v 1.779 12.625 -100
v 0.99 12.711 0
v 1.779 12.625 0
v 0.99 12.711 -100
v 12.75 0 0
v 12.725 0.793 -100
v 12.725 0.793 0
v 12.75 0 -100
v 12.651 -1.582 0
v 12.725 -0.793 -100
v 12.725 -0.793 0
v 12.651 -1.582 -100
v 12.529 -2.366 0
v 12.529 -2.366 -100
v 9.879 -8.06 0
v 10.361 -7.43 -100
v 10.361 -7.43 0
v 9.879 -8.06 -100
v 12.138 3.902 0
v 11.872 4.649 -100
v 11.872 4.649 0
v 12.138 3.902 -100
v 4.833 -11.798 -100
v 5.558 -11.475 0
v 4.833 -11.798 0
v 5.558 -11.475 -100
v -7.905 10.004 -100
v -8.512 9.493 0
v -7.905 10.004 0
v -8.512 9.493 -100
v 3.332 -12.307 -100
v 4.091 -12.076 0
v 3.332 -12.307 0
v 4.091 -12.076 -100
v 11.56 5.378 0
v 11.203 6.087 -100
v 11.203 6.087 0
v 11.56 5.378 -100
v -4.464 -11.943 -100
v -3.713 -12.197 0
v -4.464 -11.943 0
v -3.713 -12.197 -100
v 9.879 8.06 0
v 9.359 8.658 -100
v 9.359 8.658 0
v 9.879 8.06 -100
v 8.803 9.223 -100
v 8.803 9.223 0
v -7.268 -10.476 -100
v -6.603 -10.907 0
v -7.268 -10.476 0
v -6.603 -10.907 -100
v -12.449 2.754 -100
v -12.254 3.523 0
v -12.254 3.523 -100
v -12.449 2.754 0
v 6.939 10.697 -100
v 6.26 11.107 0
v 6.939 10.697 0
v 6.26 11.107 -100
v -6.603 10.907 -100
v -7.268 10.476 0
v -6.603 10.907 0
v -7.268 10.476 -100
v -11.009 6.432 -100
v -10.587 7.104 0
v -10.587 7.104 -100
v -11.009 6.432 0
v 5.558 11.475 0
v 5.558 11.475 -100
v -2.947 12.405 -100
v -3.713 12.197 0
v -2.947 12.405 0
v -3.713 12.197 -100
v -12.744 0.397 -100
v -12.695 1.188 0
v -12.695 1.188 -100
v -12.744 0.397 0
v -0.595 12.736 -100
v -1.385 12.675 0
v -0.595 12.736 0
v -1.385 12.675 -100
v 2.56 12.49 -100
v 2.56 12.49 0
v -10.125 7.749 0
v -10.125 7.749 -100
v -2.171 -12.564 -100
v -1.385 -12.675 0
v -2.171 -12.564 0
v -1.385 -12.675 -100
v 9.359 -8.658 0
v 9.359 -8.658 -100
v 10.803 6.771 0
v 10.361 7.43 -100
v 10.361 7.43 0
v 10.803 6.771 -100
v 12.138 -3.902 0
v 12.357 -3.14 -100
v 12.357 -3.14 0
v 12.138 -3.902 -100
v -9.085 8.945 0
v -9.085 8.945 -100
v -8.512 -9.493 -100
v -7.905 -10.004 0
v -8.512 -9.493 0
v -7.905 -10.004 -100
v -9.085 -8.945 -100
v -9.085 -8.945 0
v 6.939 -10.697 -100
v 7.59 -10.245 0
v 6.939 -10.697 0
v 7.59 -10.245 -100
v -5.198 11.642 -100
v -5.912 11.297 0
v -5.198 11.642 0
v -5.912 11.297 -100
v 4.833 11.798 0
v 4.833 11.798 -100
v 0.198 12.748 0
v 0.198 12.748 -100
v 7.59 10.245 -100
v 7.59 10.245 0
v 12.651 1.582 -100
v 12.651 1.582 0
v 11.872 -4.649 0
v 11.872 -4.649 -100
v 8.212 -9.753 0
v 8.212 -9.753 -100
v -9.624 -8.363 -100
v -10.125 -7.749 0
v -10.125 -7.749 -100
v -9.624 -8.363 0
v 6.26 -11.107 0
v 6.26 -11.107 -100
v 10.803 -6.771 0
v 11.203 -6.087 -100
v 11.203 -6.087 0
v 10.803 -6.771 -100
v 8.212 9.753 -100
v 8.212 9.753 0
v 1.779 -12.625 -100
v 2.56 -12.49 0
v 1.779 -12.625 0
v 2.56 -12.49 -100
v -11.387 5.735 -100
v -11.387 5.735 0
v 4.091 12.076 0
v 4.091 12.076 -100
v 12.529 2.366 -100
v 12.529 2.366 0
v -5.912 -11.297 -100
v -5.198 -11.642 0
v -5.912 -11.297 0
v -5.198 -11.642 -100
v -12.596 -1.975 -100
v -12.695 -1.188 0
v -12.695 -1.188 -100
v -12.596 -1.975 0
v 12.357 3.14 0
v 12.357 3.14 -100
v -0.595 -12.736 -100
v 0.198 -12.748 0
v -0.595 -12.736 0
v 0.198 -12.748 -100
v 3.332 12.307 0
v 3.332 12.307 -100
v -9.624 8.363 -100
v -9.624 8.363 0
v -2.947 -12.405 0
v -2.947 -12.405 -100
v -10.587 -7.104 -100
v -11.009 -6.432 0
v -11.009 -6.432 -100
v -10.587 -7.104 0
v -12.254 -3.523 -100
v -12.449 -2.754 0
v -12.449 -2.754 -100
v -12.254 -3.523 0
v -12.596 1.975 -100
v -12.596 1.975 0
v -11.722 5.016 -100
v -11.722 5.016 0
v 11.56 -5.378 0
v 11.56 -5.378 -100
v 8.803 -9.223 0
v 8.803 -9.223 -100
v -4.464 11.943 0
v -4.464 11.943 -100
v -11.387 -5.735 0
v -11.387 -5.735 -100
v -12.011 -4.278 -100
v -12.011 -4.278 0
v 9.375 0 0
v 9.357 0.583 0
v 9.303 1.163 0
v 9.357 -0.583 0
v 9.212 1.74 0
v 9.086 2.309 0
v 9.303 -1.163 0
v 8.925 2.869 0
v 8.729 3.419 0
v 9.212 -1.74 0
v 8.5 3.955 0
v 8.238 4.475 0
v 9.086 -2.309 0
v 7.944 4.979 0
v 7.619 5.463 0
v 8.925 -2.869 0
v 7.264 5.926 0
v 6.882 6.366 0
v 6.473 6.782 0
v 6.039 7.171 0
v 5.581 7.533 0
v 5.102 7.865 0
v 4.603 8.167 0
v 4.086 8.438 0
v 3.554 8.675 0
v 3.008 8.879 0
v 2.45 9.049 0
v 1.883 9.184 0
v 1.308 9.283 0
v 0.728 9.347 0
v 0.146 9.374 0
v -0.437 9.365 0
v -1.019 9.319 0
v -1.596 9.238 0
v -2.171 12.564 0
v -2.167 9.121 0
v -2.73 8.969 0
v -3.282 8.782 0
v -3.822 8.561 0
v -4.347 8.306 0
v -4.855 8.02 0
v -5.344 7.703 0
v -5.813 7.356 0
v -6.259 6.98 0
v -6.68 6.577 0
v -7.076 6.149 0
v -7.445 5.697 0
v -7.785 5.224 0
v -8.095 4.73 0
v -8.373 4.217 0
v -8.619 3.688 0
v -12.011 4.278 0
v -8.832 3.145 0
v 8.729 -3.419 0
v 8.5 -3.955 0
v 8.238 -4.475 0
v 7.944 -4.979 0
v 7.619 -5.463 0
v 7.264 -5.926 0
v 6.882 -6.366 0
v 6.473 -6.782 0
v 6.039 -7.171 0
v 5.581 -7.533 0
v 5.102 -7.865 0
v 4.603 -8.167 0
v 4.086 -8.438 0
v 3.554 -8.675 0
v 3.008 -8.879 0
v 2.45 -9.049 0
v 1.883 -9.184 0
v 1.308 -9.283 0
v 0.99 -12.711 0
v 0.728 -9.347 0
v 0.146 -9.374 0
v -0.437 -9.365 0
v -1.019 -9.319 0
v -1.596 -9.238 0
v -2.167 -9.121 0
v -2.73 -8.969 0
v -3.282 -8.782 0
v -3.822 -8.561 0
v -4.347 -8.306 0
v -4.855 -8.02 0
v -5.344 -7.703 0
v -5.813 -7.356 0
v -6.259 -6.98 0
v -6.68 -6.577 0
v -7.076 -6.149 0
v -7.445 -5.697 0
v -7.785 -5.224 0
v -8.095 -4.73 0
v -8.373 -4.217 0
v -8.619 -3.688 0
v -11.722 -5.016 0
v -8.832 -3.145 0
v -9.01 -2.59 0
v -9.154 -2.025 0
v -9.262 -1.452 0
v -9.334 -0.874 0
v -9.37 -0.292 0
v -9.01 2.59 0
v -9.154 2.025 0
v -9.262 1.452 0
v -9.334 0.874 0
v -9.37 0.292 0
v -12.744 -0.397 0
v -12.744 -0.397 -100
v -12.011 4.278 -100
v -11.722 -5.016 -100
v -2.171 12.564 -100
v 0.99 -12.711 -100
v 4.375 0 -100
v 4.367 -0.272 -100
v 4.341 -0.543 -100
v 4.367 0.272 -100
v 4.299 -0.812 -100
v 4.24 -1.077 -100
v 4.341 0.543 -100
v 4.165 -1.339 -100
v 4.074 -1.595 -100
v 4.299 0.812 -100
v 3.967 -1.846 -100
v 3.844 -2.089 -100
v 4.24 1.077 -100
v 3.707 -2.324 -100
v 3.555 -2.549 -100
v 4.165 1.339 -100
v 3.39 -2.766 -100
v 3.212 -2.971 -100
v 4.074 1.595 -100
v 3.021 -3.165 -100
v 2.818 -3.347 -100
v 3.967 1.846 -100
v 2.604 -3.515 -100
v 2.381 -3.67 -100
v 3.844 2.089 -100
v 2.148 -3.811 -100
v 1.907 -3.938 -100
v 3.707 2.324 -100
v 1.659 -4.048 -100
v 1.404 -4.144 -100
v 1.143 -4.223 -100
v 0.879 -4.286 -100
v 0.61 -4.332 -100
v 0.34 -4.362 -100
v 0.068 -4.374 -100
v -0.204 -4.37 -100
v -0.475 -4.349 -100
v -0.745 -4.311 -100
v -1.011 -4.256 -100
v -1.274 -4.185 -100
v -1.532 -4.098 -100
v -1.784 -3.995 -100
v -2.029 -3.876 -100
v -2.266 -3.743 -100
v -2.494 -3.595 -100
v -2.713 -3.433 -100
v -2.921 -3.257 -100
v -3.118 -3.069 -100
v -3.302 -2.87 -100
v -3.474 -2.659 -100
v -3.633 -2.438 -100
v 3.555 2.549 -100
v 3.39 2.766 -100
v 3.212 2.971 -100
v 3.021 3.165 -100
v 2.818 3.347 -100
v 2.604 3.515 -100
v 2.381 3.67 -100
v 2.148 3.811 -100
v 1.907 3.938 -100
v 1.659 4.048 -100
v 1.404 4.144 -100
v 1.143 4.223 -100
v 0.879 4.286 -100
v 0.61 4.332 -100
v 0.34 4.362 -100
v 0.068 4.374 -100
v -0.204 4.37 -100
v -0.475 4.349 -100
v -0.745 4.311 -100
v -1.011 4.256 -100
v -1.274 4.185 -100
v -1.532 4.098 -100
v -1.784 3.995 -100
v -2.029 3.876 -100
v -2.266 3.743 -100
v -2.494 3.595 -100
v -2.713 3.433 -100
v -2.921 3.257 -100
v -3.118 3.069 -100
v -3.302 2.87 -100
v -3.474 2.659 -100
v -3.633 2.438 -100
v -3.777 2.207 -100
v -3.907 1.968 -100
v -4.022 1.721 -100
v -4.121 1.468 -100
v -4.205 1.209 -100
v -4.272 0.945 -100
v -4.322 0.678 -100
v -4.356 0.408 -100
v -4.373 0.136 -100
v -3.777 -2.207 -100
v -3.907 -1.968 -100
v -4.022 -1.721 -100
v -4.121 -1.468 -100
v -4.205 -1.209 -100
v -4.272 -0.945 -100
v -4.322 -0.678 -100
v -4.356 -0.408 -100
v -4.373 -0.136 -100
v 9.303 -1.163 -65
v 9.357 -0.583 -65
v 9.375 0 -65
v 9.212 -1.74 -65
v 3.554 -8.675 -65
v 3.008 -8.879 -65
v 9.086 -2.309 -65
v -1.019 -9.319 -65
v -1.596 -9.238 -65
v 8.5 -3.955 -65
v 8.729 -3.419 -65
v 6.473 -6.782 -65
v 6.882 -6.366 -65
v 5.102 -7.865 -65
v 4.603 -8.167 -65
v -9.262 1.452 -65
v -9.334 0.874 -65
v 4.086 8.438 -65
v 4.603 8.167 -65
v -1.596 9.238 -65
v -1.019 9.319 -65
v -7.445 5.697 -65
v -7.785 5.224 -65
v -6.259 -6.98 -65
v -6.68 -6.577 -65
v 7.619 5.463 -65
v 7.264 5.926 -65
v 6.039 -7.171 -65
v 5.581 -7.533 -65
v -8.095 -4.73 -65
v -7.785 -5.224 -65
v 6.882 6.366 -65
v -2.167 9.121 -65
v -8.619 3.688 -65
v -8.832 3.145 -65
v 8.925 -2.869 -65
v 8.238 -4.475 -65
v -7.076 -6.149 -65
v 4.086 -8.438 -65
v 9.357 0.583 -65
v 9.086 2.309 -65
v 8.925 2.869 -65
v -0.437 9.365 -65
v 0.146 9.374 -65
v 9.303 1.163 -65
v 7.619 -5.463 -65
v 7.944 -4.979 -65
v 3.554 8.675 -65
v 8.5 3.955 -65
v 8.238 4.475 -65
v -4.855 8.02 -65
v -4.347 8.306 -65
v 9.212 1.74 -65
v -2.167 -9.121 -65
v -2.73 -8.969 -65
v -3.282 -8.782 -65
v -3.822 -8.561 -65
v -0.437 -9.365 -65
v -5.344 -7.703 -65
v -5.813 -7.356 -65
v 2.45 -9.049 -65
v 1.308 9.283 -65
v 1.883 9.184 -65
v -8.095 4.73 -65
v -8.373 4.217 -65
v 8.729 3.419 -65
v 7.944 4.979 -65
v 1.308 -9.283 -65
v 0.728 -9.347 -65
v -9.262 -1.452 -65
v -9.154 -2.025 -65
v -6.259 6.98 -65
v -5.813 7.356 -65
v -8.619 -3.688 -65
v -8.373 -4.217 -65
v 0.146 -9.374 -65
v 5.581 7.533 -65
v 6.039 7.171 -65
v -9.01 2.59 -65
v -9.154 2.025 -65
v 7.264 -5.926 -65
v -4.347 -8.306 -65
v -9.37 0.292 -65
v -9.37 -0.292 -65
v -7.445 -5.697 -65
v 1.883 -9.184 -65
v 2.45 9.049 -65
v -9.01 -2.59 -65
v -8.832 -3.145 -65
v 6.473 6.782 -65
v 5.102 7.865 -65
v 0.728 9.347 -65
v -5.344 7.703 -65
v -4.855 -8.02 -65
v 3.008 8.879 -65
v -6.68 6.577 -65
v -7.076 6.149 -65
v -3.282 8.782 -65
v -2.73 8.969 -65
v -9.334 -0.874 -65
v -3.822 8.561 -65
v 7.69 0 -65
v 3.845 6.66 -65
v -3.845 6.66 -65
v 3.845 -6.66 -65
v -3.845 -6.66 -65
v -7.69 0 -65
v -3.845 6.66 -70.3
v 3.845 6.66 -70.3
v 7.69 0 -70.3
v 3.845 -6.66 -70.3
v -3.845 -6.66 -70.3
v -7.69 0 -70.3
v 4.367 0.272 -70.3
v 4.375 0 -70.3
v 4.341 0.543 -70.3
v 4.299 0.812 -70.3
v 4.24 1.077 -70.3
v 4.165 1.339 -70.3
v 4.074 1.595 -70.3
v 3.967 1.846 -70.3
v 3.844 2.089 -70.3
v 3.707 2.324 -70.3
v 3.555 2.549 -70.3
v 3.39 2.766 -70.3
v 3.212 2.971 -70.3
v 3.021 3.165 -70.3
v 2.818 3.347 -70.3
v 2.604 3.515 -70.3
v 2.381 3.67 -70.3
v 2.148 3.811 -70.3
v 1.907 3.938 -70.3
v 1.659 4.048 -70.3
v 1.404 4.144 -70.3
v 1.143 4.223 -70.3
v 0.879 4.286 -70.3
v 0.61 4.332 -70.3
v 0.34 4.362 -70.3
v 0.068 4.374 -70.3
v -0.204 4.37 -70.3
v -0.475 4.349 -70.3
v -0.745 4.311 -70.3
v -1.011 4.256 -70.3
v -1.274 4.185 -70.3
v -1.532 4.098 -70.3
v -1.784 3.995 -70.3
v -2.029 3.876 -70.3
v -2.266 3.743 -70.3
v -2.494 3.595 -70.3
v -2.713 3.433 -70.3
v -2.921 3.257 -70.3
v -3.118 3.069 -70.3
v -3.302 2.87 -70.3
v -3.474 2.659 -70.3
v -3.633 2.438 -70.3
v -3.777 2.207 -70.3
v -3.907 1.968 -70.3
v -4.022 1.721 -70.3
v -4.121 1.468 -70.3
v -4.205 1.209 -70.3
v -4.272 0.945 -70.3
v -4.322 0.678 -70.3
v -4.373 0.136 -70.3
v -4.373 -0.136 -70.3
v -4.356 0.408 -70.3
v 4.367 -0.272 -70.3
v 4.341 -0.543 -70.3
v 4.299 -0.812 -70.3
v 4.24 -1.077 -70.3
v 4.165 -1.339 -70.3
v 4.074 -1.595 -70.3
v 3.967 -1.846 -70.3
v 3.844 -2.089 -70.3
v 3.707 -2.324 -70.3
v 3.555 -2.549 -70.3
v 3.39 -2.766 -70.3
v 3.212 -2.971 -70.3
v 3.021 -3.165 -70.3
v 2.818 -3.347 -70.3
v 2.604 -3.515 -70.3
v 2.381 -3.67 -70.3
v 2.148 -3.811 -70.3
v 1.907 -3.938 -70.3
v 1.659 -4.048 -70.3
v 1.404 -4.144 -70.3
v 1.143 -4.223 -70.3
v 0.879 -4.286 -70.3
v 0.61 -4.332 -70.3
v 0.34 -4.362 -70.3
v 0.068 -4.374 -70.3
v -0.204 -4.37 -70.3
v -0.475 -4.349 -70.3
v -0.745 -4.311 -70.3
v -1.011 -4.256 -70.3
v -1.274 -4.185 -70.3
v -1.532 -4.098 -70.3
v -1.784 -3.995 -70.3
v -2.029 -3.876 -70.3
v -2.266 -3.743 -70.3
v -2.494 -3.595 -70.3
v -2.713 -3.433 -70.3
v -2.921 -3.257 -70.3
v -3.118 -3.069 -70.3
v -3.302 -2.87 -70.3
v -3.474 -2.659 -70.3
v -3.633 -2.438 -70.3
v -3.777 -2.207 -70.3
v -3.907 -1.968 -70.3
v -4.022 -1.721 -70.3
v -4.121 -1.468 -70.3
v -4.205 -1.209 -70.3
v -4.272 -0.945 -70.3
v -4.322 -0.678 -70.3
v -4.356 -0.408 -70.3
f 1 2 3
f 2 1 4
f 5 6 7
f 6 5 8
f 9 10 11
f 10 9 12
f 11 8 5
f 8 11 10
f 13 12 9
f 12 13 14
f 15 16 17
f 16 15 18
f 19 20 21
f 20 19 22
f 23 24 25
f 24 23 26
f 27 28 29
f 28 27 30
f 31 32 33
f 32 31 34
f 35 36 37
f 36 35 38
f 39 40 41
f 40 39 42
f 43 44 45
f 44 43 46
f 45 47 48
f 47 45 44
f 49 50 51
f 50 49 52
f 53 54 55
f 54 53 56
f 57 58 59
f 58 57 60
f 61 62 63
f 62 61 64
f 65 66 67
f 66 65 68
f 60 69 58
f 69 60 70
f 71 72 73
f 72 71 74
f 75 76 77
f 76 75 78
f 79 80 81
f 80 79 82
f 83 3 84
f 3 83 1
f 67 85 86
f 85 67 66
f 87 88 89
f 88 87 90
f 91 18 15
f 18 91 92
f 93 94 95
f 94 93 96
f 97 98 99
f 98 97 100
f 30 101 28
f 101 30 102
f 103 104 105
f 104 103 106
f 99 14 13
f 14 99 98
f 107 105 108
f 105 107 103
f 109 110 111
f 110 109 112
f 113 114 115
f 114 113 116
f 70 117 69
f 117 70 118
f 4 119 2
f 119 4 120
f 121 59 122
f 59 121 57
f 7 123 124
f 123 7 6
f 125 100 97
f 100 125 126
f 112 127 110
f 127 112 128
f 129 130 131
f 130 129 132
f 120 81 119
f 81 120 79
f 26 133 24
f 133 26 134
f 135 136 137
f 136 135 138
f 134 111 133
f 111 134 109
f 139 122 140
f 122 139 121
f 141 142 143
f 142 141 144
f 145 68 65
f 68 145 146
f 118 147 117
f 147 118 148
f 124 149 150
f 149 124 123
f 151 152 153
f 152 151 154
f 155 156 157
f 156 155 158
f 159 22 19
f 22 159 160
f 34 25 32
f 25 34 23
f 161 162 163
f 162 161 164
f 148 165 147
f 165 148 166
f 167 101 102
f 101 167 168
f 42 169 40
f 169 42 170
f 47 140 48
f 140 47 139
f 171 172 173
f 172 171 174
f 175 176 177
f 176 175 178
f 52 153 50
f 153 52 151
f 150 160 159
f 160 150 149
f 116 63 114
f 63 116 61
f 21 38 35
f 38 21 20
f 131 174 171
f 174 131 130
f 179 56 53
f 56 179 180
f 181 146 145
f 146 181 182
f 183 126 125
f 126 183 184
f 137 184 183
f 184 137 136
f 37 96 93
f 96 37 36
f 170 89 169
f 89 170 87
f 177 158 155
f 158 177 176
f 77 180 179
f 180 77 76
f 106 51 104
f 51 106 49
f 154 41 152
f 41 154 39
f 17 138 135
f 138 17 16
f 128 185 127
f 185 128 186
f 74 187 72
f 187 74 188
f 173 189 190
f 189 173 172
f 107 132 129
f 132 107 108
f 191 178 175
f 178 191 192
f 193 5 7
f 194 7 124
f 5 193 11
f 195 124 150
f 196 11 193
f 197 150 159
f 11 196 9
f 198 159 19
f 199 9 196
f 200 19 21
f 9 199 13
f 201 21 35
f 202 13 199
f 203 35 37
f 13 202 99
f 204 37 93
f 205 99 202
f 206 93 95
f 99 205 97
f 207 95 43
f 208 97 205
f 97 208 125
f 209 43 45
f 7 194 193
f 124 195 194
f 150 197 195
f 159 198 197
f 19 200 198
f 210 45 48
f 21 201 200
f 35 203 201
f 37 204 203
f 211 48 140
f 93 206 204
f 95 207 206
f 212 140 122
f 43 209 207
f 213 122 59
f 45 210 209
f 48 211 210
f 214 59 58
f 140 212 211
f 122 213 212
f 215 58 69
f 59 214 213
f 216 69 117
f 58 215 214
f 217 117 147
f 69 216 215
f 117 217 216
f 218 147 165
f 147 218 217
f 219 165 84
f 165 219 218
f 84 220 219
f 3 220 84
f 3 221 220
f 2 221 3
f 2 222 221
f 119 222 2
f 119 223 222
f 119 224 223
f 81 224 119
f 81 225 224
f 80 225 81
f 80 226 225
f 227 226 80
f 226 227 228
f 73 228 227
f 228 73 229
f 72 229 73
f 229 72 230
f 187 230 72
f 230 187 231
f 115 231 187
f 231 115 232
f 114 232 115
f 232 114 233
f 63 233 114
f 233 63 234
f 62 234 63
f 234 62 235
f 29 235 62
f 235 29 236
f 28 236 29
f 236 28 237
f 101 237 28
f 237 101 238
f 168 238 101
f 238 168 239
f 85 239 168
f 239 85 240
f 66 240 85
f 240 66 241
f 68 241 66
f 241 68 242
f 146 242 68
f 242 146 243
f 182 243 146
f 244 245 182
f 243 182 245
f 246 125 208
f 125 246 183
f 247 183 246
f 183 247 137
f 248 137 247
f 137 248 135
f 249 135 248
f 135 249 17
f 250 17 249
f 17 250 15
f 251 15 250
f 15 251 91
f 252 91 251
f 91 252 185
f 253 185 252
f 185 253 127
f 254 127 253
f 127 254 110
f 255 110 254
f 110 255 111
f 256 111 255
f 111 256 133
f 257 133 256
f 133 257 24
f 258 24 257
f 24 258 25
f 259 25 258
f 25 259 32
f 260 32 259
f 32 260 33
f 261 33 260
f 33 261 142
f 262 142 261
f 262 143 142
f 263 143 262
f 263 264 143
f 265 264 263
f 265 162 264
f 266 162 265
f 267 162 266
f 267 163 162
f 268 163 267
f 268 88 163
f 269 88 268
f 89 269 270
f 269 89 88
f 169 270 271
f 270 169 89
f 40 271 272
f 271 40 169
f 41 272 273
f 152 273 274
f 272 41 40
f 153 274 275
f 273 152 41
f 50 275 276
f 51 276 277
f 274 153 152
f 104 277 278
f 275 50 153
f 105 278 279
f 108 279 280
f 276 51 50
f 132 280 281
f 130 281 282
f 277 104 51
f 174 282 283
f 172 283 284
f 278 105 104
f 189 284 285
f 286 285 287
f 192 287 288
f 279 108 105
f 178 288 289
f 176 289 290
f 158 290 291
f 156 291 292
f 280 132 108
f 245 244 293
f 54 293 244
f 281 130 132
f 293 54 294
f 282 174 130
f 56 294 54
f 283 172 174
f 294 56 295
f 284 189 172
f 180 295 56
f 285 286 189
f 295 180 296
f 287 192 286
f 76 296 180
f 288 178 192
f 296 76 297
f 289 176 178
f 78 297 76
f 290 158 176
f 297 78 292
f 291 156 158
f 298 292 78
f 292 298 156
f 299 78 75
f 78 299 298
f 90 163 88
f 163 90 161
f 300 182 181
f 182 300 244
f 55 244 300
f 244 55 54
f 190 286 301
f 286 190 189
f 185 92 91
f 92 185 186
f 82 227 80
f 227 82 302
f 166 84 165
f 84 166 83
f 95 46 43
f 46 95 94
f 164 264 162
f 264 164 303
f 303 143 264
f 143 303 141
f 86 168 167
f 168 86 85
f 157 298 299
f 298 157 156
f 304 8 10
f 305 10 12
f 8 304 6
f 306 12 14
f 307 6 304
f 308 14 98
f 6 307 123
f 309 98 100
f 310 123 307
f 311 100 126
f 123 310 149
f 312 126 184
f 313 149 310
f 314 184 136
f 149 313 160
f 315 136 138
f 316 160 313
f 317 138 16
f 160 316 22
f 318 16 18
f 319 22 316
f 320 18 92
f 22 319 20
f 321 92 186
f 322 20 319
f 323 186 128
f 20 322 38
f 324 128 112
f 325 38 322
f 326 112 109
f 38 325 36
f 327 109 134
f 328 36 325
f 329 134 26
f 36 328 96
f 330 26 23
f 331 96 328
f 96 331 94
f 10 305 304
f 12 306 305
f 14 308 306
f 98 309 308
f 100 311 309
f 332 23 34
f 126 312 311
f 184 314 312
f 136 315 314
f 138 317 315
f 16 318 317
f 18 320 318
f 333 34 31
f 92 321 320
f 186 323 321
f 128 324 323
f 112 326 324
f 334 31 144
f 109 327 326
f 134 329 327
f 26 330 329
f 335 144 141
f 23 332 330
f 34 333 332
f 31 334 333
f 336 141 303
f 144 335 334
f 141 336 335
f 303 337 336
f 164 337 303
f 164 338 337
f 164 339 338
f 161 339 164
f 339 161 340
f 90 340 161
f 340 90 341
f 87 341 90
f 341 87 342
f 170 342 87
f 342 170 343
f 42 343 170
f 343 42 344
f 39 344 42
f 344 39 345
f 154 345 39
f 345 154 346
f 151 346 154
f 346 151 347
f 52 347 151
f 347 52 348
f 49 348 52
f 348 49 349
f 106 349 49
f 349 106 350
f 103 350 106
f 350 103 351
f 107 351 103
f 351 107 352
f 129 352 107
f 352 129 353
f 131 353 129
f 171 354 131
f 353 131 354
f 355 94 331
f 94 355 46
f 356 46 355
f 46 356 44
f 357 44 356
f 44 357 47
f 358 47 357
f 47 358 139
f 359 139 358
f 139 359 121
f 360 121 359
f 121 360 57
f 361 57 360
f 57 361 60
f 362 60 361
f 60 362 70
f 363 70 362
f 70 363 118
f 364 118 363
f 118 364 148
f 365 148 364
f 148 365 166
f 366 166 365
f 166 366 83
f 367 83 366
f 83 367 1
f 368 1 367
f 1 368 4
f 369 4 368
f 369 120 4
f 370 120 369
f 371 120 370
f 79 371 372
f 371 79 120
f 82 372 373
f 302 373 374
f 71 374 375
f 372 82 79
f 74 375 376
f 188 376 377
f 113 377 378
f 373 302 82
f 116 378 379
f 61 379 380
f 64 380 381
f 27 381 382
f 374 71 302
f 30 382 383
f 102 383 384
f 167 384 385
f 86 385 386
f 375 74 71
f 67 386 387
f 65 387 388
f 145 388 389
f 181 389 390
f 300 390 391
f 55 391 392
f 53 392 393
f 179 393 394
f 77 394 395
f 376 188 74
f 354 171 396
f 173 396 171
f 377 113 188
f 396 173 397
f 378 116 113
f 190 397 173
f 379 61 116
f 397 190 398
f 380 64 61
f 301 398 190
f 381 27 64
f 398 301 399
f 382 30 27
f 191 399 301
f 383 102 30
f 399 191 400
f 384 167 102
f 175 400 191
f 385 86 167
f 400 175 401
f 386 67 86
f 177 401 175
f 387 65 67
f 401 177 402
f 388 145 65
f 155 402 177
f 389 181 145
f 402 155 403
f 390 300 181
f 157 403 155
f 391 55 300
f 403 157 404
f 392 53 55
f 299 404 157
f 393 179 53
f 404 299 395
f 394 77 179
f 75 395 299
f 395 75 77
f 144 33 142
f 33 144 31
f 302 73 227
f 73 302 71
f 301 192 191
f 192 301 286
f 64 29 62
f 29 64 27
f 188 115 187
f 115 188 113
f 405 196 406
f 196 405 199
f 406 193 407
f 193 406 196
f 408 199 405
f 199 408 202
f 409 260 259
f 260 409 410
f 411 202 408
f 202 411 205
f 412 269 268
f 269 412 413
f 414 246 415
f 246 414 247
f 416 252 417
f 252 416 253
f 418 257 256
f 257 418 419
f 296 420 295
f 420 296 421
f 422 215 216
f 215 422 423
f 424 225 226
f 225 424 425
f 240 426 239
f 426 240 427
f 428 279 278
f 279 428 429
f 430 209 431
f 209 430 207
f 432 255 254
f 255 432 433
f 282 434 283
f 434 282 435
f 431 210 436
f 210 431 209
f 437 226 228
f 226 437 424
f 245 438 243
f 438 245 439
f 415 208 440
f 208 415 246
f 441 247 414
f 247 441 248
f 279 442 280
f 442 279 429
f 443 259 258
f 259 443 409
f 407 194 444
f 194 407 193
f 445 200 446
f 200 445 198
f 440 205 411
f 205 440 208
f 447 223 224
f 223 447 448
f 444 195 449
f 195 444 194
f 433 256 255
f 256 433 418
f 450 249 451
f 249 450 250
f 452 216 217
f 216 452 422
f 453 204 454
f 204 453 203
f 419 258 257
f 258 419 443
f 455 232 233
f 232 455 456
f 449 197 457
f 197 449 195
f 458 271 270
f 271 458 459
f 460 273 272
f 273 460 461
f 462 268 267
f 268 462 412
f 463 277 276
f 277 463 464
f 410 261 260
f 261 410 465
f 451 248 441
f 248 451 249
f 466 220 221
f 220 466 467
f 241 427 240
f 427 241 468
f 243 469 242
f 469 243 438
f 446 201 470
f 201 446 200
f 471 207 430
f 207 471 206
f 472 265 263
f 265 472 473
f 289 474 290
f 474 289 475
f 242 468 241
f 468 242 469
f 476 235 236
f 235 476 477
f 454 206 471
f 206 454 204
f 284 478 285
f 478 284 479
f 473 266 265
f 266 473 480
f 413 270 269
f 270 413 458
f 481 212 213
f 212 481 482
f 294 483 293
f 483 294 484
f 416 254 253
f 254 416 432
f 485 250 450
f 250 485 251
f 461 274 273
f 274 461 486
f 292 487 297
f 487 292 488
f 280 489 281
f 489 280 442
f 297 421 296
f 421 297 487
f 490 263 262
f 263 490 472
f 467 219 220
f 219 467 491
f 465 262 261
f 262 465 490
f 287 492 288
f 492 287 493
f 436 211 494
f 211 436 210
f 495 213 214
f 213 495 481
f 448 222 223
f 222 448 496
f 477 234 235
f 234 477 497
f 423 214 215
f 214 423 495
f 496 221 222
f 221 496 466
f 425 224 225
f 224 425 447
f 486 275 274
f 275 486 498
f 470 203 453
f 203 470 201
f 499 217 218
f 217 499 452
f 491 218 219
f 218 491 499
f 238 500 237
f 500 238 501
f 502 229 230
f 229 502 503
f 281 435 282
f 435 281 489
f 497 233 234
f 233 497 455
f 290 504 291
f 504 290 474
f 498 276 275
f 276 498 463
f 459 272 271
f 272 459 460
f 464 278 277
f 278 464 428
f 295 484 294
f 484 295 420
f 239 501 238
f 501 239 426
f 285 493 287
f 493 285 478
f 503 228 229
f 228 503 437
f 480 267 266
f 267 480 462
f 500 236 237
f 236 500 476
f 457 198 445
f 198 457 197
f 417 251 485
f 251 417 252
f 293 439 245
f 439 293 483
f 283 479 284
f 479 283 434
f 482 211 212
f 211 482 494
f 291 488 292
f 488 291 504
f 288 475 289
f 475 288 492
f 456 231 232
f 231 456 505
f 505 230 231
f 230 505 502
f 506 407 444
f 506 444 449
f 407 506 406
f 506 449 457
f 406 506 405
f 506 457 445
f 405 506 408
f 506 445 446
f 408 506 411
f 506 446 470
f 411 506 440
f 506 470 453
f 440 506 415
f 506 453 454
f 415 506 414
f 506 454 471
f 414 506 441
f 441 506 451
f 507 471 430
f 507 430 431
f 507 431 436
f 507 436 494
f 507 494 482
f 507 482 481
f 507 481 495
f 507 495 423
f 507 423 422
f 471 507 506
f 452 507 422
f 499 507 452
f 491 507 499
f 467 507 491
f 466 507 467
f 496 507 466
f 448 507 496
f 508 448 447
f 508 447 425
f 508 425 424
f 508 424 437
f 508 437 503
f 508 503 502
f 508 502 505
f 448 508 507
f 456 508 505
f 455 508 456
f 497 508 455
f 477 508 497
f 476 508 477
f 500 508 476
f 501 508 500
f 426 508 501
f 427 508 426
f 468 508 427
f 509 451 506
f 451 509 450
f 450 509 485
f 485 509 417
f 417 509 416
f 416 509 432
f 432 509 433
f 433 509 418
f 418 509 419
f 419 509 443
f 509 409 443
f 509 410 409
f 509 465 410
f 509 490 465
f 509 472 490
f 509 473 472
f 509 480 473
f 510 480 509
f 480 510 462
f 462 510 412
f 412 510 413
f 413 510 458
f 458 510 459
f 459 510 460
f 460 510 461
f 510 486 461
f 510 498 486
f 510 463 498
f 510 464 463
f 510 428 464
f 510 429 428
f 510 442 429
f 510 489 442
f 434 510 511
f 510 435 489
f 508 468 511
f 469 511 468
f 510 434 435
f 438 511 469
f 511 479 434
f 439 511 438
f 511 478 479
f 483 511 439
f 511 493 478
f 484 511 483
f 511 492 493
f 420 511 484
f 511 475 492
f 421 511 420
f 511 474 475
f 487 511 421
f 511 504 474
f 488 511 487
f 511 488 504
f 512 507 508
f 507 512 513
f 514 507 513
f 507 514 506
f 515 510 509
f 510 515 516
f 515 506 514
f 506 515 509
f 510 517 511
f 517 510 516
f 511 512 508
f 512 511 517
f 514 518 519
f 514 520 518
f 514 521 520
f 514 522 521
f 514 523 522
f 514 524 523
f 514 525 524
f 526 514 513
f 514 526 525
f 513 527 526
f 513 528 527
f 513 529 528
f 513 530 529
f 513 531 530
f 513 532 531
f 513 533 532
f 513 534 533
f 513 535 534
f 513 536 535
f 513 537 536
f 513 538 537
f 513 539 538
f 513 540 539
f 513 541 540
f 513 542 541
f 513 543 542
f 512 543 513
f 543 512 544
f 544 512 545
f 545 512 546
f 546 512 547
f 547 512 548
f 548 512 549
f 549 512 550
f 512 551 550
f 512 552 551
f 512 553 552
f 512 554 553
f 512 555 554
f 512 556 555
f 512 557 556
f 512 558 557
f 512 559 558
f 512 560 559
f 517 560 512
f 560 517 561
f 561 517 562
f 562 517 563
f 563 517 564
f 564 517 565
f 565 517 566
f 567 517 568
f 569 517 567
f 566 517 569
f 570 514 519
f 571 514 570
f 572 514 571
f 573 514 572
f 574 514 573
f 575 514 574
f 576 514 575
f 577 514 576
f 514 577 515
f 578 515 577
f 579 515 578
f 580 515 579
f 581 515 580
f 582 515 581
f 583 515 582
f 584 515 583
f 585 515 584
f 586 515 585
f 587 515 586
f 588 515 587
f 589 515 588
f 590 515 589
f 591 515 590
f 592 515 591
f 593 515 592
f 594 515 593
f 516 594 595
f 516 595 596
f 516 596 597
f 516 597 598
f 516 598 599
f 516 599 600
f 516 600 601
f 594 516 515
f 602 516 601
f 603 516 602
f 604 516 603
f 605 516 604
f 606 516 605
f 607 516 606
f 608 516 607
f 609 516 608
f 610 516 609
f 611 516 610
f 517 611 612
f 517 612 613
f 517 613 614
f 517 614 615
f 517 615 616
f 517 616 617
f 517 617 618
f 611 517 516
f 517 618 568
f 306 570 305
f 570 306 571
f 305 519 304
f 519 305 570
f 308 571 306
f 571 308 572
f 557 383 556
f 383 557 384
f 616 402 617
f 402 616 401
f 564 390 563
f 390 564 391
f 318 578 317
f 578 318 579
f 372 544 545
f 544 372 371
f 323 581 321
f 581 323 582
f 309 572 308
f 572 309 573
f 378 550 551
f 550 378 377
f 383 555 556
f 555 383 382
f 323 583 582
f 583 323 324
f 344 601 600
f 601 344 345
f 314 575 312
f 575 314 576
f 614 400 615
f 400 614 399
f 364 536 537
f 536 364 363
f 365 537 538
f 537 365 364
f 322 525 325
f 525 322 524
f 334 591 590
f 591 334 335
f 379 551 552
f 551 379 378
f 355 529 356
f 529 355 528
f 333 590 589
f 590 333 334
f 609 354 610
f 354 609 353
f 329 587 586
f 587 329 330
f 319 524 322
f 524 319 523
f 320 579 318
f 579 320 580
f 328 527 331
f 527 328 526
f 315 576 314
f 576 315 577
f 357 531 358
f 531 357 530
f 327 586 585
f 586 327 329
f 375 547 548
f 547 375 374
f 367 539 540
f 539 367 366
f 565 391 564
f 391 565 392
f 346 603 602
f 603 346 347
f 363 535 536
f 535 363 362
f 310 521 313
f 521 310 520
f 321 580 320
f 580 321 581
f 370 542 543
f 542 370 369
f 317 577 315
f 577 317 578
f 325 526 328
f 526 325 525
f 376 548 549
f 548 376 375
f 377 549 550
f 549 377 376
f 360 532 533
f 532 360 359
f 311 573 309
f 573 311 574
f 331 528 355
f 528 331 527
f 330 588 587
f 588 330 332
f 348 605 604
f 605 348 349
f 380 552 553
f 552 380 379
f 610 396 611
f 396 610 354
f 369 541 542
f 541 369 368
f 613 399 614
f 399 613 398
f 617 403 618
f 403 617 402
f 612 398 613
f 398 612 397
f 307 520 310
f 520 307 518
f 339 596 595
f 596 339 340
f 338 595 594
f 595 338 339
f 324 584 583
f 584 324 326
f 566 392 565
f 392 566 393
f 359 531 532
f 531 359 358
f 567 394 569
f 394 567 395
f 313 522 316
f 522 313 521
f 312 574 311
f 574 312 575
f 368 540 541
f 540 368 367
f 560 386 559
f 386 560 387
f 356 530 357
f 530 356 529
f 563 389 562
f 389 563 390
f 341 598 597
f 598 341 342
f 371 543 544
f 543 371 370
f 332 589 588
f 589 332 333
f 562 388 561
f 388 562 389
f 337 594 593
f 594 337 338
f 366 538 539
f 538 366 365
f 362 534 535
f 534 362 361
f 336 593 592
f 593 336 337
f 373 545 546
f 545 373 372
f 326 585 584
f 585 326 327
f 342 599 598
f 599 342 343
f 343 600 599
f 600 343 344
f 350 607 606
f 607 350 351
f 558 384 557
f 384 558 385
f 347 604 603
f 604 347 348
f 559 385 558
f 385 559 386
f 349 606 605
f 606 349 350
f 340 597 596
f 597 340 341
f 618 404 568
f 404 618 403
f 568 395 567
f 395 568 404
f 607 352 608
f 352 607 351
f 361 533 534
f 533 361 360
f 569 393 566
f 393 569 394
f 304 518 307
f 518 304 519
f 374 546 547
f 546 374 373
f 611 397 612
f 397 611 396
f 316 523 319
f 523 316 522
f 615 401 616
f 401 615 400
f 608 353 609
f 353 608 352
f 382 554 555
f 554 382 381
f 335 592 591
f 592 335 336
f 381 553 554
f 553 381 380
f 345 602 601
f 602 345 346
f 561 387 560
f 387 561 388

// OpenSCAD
/*
    SDC2300 Battery Pack.

    Copyright 2022, Tim Molteno. tim@molteno.net
  
    This program is free software: you can redistribute it and/or modify
    it under the terms of the GNU General Public License as published by
    the Free Software Foundation, either version 3 of the License, or
    (at your option) any later version.

    This program is distributed in the hope that it will be useful,
    but WITHOUT ANY WARRANTY; without even the implied warranty of
    MERCHANTABILITY or FITNESS FOR A PARTICULAR PURPOSE.  See the
    GNU General Public License for more details.

    You should have received a copy of the GNU General Public License
    along with this program.  If not, see <http://www.gnu.org/licenses/>.
*/
$fn = 101;

c_cell_diameter = 25.5;
c_cell_length = 50.0;

clearance_d = 0.75;

total_length = 2*c_cell_length;

module b18650() {
    cylinder(d=18+clearance_d, h=65);
    translate([0,0,65]) cylinder(d=6, h=2);
}

module m8(len) {
    cylinder(d=14.38 + 1, h=5.3, $fn=6);
    translate([0,0,5.3]) cylinder(d=8+clearance_d, h=len);
}


module sdc2300_battery() {
    difference() {
        cylinder(d=c_cell_diameter, h=total_length);
        union () {
            cylinder(d=18+clearance_d, h=30, center=true);
        }
    }
}

module hollow() {
    union () {
        b18650();
        translate([0,0,65]) m8(30);
    }
}

module sdc_2300_holder() {
    difference() {
        sdc2300_battery();

        hollow();
    }
}

rotate([180,0,0]) sdc_2300_holder();
